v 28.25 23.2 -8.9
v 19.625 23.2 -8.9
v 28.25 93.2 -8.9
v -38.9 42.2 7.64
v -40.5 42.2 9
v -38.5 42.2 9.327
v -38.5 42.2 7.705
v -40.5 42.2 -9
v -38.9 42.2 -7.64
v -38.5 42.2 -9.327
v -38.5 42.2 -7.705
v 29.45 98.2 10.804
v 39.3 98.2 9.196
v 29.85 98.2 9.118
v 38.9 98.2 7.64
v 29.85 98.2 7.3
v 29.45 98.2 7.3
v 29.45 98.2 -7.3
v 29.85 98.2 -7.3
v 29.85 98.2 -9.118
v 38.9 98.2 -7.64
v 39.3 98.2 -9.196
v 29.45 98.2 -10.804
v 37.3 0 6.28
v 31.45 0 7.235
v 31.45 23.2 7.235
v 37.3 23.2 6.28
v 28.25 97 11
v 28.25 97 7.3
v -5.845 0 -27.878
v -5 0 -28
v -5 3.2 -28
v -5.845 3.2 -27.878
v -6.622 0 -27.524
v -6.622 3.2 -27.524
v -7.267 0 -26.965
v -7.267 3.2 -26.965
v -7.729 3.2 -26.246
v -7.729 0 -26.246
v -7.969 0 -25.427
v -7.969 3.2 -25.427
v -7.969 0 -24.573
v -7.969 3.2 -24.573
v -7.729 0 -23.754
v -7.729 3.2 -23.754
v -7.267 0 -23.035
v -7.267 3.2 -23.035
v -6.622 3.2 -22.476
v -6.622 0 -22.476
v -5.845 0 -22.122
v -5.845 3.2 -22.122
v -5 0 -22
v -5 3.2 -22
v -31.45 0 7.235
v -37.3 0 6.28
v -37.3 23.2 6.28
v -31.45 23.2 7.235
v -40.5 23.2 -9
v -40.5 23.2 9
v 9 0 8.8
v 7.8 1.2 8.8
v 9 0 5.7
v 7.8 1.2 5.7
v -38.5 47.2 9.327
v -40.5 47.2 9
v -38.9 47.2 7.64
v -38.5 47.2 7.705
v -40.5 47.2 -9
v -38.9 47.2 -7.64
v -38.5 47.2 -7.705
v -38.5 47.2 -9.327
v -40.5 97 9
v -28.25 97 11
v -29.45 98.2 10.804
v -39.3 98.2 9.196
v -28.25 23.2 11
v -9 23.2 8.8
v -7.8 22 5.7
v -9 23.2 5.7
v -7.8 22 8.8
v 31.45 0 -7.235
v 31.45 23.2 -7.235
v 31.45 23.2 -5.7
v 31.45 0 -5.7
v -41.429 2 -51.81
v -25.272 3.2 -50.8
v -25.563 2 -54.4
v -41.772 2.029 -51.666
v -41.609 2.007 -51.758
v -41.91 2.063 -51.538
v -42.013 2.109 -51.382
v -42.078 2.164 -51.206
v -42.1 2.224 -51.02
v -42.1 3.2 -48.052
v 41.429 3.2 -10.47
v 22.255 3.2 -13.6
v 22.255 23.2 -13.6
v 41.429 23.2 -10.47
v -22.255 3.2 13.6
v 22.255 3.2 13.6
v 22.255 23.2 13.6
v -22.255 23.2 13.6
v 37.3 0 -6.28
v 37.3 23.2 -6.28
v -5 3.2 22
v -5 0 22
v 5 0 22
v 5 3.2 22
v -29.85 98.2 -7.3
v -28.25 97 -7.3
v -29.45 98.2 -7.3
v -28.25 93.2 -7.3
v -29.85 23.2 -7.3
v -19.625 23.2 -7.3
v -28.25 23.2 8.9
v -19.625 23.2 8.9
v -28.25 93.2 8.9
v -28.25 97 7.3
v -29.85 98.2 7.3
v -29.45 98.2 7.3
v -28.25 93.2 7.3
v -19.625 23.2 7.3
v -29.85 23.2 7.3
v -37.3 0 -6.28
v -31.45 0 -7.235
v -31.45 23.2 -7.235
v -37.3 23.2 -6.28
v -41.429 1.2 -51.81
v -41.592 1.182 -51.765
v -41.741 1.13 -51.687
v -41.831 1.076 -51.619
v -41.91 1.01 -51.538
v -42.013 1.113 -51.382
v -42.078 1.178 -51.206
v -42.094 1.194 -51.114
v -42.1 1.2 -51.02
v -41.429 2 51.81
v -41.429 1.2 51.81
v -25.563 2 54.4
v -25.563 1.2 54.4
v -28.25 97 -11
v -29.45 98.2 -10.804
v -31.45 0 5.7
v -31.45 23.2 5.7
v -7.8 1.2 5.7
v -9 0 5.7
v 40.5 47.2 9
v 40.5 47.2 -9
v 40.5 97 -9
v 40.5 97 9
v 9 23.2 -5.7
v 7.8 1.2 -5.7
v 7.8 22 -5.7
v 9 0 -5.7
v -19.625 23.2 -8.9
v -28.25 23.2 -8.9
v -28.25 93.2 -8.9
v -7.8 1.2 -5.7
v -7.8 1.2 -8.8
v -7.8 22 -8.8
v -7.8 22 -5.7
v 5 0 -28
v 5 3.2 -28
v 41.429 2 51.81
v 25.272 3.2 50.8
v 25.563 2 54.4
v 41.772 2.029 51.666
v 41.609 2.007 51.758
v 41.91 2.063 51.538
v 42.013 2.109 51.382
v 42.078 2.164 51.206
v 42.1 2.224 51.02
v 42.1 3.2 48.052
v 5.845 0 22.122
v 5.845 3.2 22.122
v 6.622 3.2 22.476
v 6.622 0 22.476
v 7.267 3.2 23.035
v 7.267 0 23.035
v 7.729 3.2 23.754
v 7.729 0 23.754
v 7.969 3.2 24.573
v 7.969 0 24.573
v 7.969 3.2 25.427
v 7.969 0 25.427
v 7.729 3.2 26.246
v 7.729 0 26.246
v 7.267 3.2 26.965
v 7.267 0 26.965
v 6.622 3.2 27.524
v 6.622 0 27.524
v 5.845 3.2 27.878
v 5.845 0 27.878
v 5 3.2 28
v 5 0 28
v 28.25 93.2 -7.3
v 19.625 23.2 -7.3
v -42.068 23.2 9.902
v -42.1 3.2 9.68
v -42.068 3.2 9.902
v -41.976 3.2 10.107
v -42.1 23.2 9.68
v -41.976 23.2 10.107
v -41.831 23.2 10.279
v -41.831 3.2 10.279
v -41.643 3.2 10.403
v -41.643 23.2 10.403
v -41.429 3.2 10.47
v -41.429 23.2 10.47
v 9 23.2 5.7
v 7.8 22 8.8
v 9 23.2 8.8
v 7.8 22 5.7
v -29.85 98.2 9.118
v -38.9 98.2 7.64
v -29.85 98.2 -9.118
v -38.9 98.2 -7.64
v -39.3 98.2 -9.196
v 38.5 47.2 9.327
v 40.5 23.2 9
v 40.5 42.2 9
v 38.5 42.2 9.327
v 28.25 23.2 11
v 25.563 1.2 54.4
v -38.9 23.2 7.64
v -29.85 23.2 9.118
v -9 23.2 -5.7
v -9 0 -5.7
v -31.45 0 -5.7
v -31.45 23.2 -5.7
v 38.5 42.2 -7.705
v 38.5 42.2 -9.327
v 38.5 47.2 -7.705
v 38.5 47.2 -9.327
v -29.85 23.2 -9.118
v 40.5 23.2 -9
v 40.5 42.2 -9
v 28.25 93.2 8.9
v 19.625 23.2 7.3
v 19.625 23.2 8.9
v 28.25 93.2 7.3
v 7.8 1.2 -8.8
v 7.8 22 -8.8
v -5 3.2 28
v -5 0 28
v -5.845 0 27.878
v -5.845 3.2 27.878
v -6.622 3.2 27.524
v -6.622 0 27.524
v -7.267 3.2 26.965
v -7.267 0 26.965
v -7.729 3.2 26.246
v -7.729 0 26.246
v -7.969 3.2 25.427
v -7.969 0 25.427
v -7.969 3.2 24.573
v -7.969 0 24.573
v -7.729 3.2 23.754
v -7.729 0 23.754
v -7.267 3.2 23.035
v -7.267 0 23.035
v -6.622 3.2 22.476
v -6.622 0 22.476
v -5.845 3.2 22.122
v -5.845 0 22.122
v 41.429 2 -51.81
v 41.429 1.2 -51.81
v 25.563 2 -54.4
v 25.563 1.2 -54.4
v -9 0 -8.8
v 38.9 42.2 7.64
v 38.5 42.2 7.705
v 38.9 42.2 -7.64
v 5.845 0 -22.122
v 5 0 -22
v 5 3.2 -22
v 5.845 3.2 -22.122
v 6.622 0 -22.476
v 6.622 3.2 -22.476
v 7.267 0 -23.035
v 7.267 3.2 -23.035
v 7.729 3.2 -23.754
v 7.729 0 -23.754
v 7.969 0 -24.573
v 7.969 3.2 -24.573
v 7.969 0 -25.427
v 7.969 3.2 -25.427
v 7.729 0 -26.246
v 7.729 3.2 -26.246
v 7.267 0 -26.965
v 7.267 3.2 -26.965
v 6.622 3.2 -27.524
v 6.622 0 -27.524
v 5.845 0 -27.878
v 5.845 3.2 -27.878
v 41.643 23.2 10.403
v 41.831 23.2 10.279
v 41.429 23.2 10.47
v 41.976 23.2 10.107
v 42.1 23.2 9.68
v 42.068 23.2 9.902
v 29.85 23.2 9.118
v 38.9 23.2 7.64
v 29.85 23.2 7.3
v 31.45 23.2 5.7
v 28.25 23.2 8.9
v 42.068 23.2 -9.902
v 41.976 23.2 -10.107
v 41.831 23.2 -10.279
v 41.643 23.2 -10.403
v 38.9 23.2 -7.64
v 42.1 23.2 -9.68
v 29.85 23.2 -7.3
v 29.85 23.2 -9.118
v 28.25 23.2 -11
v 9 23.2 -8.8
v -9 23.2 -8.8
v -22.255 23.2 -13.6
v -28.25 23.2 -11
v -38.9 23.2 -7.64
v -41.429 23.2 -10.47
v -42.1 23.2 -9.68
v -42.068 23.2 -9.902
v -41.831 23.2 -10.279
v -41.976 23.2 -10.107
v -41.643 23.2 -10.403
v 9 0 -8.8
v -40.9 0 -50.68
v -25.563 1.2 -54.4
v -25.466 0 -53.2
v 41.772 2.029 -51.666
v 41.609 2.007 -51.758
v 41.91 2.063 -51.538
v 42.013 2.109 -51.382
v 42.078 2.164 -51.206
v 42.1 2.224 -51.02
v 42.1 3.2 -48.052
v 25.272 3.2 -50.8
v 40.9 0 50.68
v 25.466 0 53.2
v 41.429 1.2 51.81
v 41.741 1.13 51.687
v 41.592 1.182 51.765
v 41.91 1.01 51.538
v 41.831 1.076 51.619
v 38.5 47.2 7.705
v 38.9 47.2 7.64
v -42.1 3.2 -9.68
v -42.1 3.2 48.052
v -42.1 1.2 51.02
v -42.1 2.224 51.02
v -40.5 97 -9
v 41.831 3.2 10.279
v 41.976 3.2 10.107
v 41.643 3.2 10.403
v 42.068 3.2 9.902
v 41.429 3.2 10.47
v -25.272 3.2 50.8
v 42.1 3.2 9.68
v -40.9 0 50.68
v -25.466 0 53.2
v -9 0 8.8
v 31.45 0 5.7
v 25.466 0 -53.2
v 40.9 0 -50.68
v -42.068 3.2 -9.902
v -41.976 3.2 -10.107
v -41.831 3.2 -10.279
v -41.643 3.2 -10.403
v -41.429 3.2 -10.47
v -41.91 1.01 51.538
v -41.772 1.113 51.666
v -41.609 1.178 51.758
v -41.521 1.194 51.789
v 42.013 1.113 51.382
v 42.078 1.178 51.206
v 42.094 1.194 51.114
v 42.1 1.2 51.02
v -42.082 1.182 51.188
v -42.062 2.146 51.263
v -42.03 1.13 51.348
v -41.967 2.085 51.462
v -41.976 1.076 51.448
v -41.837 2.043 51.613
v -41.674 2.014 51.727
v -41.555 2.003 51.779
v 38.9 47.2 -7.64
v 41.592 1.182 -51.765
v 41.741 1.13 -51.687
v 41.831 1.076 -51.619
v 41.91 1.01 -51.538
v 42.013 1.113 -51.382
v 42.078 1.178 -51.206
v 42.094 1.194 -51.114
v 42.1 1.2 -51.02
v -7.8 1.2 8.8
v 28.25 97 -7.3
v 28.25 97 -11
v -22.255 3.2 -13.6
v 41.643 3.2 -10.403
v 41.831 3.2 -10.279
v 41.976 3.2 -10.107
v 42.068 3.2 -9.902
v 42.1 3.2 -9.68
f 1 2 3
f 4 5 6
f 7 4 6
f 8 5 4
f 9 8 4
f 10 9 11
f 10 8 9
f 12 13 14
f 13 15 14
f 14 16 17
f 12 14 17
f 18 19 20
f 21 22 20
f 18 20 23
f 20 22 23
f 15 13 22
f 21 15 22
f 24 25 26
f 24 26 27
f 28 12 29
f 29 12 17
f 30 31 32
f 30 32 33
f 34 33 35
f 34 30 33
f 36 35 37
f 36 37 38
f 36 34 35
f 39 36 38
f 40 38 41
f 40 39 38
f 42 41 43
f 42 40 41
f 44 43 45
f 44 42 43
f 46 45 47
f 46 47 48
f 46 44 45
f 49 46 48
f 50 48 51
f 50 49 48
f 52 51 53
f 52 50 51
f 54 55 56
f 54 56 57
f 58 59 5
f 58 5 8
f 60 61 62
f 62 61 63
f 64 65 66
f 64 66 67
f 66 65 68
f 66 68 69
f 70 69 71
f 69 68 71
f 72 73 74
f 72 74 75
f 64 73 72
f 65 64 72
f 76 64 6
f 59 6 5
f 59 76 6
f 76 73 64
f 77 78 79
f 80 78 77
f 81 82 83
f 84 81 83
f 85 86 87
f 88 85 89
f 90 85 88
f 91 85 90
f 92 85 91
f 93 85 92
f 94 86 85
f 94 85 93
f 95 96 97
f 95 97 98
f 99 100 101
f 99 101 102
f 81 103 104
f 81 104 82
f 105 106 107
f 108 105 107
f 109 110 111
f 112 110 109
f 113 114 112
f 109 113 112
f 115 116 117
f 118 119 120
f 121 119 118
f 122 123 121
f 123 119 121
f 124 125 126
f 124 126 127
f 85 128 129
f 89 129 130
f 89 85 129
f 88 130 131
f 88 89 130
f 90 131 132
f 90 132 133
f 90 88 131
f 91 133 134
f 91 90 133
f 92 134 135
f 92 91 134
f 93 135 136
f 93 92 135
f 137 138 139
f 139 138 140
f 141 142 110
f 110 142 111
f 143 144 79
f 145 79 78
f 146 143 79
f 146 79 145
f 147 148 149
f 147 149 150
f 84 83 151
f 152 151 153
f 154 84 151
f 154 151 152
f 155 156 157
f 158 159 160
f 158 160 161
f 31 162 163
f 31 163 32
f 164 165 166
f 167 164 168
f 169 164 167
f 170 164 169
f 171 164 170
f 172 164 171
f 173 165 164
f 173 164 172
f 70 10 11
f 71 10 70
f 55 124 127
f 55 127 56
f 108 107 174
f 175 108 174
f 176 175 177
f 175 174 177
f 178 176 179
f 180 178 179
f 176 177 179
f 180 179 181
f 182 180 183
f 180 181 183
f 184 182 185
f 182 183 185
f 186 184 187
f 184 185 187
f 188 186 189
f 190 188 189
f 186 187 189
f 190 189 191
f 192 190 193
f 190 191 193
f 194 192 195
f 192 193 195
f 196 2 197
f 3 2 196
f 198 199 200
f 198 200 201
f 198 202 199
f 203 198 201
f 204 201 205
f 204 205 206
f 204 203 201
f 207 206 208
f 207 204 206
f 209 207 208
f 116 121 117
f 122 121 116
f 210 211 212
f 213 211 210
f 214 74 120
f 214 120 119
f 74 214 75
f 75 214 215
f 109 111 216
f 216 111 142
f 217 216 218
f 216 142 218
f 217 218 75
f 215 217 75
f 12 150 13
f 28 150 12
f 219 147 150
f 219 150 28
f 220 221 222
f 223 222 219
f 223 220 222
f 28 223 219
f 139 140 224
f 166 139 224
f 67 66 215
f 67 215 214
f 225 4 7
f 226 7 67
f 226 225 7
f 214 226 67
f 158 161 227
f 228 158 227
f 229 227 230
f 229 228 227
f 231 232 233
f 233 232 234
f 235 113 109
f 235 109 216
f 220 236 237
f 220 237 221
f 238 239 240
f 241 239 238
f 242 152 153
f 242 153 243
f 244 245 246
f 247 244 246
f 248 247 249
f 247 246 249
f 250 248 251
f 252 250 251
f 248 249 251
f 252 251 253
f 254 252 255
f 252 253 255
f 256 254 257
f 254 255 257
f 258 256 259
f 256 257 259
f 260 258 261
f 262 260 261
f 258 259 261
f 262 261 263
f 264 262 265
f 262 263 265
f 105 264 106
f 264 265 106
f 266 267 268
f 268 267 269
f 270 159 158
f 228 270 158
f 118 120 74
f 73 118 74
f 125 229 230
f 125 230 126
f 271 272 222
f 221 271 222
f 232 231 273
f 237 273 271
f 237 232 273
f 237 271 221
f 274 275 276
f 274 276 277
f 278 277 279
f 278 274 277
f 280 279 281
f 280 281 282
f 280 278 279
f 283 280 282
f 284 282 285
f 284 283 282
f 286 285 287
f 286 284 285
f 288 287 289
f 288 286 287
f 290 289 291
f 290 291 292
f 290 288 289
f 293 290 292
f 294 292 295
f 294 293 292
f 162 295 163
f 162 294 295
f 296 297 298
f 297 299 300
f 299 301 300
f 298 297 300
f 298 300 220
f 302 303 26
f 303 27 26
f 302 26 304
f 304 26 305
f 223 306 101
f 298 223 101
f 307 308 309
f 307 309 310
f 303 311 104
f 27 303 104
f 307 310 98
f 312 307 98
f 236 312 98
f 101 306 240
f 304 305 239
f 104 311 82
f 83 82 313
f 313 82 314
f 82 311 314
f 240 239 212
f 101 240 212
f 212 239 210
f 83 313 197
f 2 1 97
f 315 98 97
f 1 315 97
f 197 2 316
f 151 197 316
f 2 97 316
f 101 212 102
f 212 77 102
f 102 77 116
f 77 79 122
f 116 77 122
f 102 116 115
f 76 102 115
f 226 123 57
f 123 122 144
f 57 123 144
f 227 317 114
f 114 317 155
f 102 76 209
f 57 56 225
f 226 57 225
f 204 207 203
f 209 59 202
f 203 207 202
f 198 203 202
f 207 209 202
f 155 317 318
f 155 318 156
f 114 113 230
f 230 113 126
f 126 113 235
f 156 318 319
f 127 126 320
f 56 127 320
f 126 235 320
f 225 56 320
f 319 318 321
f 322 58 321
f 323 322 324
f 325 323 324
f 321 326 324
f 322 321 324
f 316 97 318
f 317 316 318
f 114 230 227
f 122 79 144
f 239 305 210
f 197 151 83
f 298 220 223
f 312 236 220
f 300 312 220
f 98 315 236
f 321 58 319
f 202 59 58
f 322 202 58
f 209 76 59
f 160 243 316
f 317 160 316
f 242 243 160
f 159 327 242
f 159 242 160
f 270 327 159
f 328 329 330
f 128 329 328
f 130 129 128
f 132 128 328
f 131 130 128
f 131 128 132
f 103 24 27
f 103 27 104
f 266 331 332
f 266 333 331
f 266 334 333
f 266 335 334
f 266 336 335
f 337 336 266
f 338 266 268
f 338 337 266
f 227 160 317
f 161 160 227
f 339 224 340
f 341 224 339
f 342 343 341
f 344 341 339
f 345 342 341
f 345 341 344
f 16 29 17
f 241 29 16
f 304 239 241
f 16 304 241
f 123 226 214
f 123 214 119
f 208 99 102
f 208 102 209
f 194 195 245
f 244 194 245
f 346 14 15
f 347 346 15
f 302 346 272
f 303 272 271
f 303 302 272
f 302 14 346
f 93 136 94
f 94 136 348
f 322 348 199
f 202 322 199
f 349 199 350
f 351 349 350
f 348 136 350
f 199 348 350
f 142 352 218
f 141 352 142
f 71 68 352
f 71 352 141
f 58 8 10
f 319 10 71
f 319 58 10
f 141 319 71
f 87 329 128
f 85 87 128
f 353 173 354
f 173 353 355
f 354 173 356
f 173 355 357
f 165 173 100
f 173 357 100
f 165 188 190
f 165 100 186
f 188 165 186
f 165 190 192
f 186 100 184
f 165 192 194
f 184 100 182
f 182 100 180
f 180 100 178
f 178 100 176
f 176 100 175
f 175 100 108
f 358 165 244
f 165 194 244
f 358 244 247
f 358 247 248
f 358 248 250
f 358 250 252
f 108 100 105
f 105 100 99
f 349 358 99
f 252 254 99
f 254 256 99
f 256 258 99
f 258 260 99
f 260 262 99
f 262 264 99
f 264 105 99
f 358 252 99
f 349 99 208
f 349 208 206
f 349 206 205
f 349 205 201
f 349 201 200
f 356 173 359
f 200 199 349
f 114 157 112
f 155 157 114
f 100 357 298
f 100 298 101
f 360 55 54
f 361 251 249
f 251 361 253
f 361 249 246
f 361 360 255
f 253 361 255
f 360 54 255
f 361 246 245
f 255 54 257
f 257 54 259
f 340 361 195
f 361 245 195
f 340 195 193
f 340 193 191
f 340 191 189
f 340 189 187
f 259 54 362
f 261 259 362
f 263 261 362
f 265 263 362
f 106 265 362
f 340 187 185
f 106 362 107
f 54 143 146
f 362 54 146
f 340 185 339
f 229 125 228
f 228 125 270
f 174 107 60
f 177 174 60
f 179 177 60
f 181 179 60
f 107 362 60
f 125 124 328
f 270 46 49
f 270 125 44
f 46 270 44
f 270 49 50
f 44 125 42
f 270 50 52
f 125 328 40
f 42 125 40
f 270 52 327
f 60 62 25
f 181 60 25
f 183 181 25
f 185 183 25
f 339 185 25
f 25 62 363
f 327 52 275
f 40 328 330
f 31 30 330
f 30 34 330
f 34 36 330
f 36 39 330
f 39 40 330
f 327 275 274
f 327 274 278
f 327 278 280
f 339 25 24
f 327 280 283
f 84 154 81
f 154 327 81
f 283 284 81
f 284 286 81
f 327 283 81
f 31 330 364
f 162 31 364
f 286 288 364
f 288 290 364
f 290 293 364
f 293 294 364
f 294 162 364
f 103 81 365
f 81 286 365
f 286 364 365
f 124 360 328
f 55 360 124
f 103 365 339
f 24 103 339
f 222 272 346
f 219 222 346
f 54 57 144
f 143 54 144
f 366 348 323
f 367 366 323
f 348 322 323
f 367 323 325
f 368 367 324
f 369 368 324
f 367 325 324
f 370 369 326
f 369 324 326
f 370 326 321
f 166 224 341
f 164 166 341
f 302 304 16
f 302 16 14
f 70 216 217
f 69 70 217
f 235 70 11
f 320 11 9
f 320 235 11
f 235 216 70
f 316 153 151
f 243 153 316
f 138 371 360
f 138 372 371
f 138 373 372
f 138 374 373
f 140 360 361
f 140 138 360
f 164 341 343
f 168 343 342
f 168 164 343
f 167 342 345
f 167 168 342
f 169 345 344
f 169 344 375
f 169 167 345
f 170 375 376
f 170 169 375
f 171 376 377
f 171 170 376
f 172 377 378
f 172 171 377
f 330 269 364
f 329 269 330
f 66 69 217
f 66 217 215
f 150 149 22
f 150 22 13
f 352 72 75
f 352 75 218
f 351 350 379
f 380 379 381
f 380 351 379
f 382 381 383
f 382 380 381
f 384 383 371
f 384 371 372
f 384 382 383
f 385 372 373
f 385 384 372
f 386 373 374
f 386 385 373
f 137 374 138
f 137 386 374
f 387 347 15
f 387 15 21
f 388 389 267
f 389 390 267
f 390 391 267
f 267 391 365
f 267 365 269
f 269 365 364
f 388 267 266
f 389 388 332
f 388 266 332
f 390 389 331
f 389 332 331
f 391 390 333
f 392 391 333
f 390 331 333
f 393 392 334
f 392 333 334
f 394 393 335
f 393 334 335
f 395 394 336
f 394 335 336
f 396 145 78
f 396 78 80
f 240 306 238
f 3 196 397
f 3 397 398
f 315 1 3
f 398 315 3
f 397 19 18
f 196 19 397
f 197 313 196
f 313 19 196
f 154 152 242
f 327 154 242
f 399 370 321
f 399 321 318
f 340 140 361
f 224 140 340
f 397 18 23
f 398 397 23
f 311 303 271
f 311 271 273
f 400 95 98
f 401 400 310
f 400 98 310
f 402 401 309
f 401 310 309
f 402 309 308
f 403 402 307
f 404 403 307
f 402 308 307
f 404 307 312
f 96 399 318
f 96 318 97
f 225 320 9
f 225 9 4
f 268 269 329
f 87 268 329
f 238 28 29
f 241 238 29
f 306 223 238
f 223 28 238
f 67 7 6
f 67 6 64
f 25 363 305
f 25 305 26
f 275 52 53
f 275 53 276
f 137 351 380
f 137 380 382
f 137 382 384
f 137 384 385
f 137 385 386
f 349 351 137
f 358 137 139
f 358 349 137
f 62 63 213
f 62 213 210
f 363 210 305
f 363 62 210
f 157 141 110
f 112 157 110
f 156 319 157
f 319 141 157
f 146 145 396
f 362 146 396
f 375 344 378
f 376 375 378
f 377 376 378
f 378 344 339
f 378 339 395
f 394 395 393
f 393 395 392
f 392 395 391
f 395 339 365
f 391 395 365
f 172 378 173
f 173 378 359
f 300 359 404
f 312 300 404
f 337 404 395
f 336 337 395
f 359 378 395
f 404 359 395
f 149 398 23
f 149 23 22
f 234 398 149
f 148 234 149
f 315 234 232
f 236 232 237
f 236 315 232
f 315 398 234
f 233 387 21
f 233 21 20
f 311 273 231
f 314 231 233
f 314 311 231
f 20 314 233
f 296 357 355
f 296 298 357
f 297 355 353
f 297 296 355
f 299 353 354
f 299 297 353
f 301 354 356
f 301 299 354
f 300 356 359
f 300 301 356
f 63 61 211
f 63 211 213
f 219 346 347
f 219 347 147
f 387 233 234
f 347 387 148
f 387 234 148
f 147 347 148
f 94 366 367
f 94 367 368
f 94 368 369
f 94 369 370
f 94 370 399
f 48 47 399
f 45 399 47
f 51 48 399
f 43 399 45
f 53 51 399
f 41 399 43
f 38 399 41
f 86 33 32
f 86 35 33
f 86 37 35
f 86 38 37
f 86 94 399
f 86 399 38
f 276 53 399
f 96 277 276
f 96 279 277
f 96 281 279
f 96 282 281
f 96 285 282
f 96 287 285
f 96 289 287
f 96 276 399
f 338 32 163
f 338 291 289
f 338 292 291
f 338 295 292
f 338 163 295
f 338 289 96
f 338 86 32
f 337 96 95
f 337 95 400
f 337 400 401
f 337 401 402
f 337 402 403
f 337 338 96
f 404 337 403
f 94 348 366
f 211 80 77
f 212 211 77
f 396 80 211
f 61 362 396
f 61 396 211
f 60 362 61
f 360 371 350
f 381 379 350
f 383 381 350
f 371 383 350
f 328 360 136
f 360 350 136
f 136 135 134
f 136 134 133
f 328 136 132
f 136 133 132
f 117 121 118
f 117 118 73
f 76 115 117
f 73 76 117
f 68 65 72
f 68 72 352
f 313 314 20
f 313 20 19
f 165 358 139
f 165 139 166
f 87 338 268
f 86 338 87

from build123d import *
from OCP.BRepFilletAPI import BRepFilletAPI_MakeChamfer

# Parameters (mm, degrees)
BOSS_EXTRUDE1_DEPTH     = 23.2
BOSS_EXTRUDE2_START     = 23.2
BOSS_EXTRUDE2_DEPTH     = 75
CUT_EXTRUDE1_DEPTH      = 108.706127959
CUT_EXTRUDE1_DEPTH_BACK = 108.706127959
SKETCH2_W               = 2
SKETCH2_H               = 5
CUT_EXTRUDE2_DEPTH      = 108.706127959
CUT_EXTRUDE2_DEPTH_BACK = 108.706127959
BOSS_EXTRUDE3_DEPTH     = 3.2
CUT_EXTRUDE3_DEPTH      = 111.057303256
CUT_EXTRUDE3_DEPTH_BACK = 111.057303256
BOSS_EXTRUDE4_DEPTH     = 3.2
BOSS_EXTRUDE5_DEPTH     = 3.2
CUT_EXTRUDE4_DEPTH      = 3.2
CHAMFER1_SIZE           = 1.2
CHAMFER1_SIZE2          = 3.6
CHAMFER2_SIZE           = 1.2
FILLET1_R               = 0.8


with BuildPart() as part:
    # Sketch1 → Boss-Extrude1 (new body)
    with BuildSketch(Plane(origin=(0, 0, 0), x_dir=(1, 0, 0), z_dir=(0, 1, 0))):
        Polygon((-22.25475327, 13.6), (22.25475327, 13.6), (42.1, 10.359959718), (42.1, -10.359959718), (22.25475327, -13.6), (-22.25475327, -13.6), (-42.1, -10.359959718), (-42.1, 10.359959718), align=None)
    extrude(amount=BOSS_EXTRUDE1_DEPTH)

    # Sketch1<3> → Boss-Extrude2 (add)
    with BuildSketch(Plane(origin=(0, 0, 0), x_dir=(1, 0, 0), z_dir=(0, 1, 0)).offset(BOSS_EXTRUDE2_START)):
        Polygon((40.5, -9), (28.25, -11), (28.25, -8.9), (11, -8.9), (11, -12), (-11, -12), (-11, -8.9), (-28.25, -8.9), (-28.25, -11), (-40.5, -9), (-40.5, 9), (-28.25, 11), (-28.25, 8.9), (-11, 8.9), (-11, 12), (11, 12), (11, 8.9), (28.25, 8.9), (28.25, 11), (40.5, 9), align=None)
        Polygon((-38.9, -7.640040282), (-29.85, -9.117591303), (-29.85, -7.3), (-9.4, -7.3), (-9.4, -10.4), (9.4, -10.4), (9.4, -7.3), (29.85, -7.3), (29.85, -9.117591303), (38.9, -7.640040282), (38.9, 7.640040282), (29.85, 9.117591303), (29.85, 7.3), (9.4, 7.3), (9.4, 10.4), (-9.4, 10.4), (-9.4, 7.3), (-29.85, 7.3), (-29.85, 9.117591303), (-38.9, 7.640040282), align=None, mode=Mode.SUBTRACT)
    extrude(amount=BOSS_EXTRUDE2_DEPTH)

    # Sketch2 → Cut-Extrude1 (cut, two sides: drawn at the far end of the back side and taken through both)
    with BuildSketch(Plane.XY.offset(-CUT_EXTRUDE1_DEPTH_BACK)):
        with Locations((-39.5, 44.7)):
            Rectangle(SKETCH2_W, SKETCH2_H)
        with Locations((39.5, 44.7)):
            Rectangle(SKETCH2_W, SKETCH2_H)
    extrude(amount=CUT_EXTRUDE1_DEPTH + CUT_EXTRUDE1_DEPTH_BACK, mode=Mode.SUBTRACT)

    # Sketch3 → Cut-Extrude2 (cut, two sides: drawn at the far end of the back side and taken through both)
    with BuildSketch(Plane.XY.offset(-CUT_EXTRUDE2_DEPTH_BACK)):
        Polygon((-28.25, 93.2), (-19.625, 23.2), (19.625, 23.2), (28.25, 93.2), (28.25, 98.2), (-28.25, 98.2), align=None)
    extrude(amount=CUT_EXTRUDE2_DEPTH + CUT_EXTRUDE2_DEPTH_BACK, mode=Mode.SUBTRACT)

    # Sketch4 → Boss-Extrude3 (add)
    with BuildSketch(Plane(origin=(0, 0, 0), x_dir=(1, 0, 0), z_dir=(0, 1, 0))):
        Polygon((23.292779429, 26.4), (42.1, 23.329433376), (42.1, -23.329433376), (23.292779429, -26.4), (-23.292779429, -26.4), (-42.1, -23.329433376), (-42.1, 23.329433376), (-23.292779429, 26.4), align=None)
    extrude(amount=BOSS_EXTRUDE3_DEPTH)

    # Sketch1<4> → Cut-Extrude3 (cut, two sides: drawn at the far end of the back side and taken through both)
    with BuildSketch(Plane(origin=(0, 0, 0), x_dir=(1, 0, 0), z_dir=(0, 1, 0)).offset(-CUT_EXTRUDE3_DEPTH_BACK)):
        Polygon((-31.45, -5.7), (-7.8, -5.7), (-7.8, -8.8), (7.8, -8.8), (7.8, -5.7), (31.45, -5.7), (31.45, -7.235182606), (37.3, -6.280080565), (37.3, 6.280080565), (31.45, 7.235182606), (31.45, 5.7), (7.8, 5.7), (7.8, 8.8), (-7.8, 8.8), (-7.8, 5.7), (-31.45, 5.7), (-31.45, 7.235182606), (-37.3, 6.280080565), (-37.3, -6.280080565), (-31.45, -7.235182606), align=None)
    extrude(amount=CUT_EXTRUDE3_DEPTH + CUT_EXTRUDE3_DEPTH_BACK, mode=Mode.SUBTRACT)

    # Sketch5 → Boss-Extrude4 (add)
    with BuildSketch(Plane(origin=(0, 0, 0), x_dir=(1, 0, 0), z_dir=(0, 1, 0))):
        Polygon((23.292779429, 26.4), (42.1, 23.329433376), (42.1, 51.700157004), (25.563461651, 54.4), (-25.563461651, 54.4), (-42.1, 51.700157004), (-42.1, 23.329433376), (-23.292779429, 26.4), align=None)
        Polygon((-42.1, -23.329433376), (-42.1, -51.700157004), (-25.563461651, -54.4), (25.563461651, -54.4), (42.1, -51.700157004), (42.1, -23.329433376), (23.292779429, -26.4), (-23.292779429, -26.4), align=None)
    extrude(amount=BOSS_EXTRUDE4_DEPTH)

    # Sketch6 → Boss-Extrude5 (add)
    with BuildSketch(Plane(origin=(0, 0, 0), x_dir=(1, 0, 0), z_dir=(0, 1, 0))):
        Polygon((25.563461651, 54.4), (42.1, 51.700157004), (42.1, 48.100157004), (-42.1, 48.100157004), (-42.1, 51.700157004), (-25.563461651, 54.4), align=None)
        Polygon((42.1, -48.100157004), (42.1, -51.700157004), (25.563461651, -54.4), (-25.563461651, -54.4), (-42.1, -51.700157004), (-42.1, -48.100157004), align=None)
    extrude(amount=BOSS_EXTRUDE5_DEPTH)

    # Sketch7 → Cut-Extrude4 (cut)
    with BuildSketch(Plane(origin=(0, 0, 0), x_dir=(0, 0, -1), z_dir=(0, 1, 0))):
        with BuildLine():
            Line((28, -5), (28, 5))
            ThreePointArc((28, 5), (25, 8), (22, 5))
            Line((22, 5), (22, -5))
            ThreePointArc((22, -5), (25, -8), (28, -5))
        make_face()
        with BuildLine():
            Line((-28, -5), (-28, 5))
            ThreePointArc((-28, 5), (-25, 8), (-22, 5))
            Line((-22, 5), (-22, -5))
            ThreePointArc((-22, -5), (-25, -8), (-28, -5))
        make_face()
    extrude(amount=CUT_EXTRUDE4_DEPTH, mode=Mode.SUBTRACT)

    # Chamfer1: one chamfer whose edges measure the first distance from different faces: ONE call of the kernel's chamfer builder (chamfer() names one face for all edges)
    chamfer1_edges_1 = [part.edges().sort_by_distance(p)[0] for p in [
        (-33.831730825, 3.2, 53.050078502),
    ]]
    chamfer1_side_1 = [part.faces().sort_by_distance(p)[0] for p in [
        (-33.831730825, 1.6, 53.050078502),
    ]]
    chamfer1_edges_2 = [part.edges().sort_by_distance(p)[0] for p in [
        (0, 3.2, 54.4),
    ]]
    chamfer1_side_2 = [part.faces().sort_by_distance(p)[0] for p in [
        (0, 1.6, 54.4),
    ]]
    chamfer1_edges_3 = [part.edges().sort_by_distance(p)[0] for p in [
        (33.831730825, 3.2, 53.050078502),
    ]]
    chamfer1_side_3 = [part.faces().sort_by_distance(p)[0] for p in [
        (33.831730825, 1.6, 53.050078502),
    ]]
    chamfer1_edges_4 = [part.edges().sort_by_distance(p)[0] for p in [
        (33.831730825, 3.2, -53.050078502),
    ]]
    chamfer1_side_4 = [part.faces().sort_by_distance(p)[0] for p in [
        (33.831730825, 1.6, -53.050078502),
    ]]
    chamfer1_edges_5 = [part.edges().sort_by_distance(p)[0] for p in [
        (0, 3.2, -54.4),
    ]]
    chamfer1_side_5 = [part.faces().sort_by_distance(p)[0] for p in [
        (0, 1.6, -54.4),
    ]]
    chamfer1_edges_6 = [part.edges().sort_by_distance(p)[0] for p in [
        (-33.831730825, 3.2, -53.050078502),
    ]]
    chamfer1_side_6 = [part.faces().sort_by_distance(p)[0] for p in [
        (-33.831730825, 1.6, -53.050078502),
    ]]
    chamfer1 = BRepFilletAPI_MakeChamfer(part.part.solid().wrapped)
    for e in chamfer1_edges_1:
        chamfer1.Add(CHAMFER1_SIZE, CHAMFER1_SIZE2, e.wrapped, chamfer1_side_1[0].wrapped)  # the first distance lies on this face
    for e in chamfer1_edges_2:
        chamfer1.Add(CHAMFER1_SIZE, CHAMFER1_SIZE2, e.wrapped, chamfer1_side_2[0].wrapped)  # the first distance lies on this face
    for e in chamfer1_edges_3:
        chamfer1.Add(CHAMFER1_SIZE, CHAMFER1_SIZE2, e.wrapped, chamfer1_side_3[0].wrapped)  # the first distance lies on this face
    for e in chamfer1_edges_4:
        chamfer1.Add(CHAMFER1_SIZE, CHAMFER1_SIZE2, e.wrapped, chamfer1_side_4[0].wrapped)  # the first distance lies on this face
    for e in chamfer1_edges_5:
        chamfer1.Add(CHAMFER1_SIZE, CHAMFER1_SIZE2, e.wrapped, chamfer1_side_5[0].wrapped)  # the first distance lies on this face
    for e in chamfer1_edges_6:
        chamfer1.Add(CHAMFER1_SIZE, CHAMFER1_SIZE2, e.wrapped, chamfer1_side_6[0].wrapped)  # the first distance lies on this face
    add(Compound.cast(chamfer1.Shape()), mode=Mode.REPLACE)

    # Chamfer2
    chamfer2_edges = [part.edges().sort_by_distance(p)[0] for p in [
        (-42.1, 0, 0),
        (-7.8, 23.2, 7.25),
        (7.8, 23.2, 7.25),
        (7.8, 23.2, -7.25),
        (-7.8, 23.2, -7.25),
        (-7.8, 0, -7.25),
        (7.8, 0, -7.25),
        (7.8, 0, 7.25),
        (-7.8, 0, 7.25),
        (40.5, 98.2, 0),
        (28.25, 98.2, -9.15),
        (-28.25, 98.2, 9.15),
        (0, 0, 54.4),
        (33.831730825, 0, 53.050078502),
        (-33.831730825, 0, 53.050078502),
        (33.831730825, 0, -53.050078502),
        (0, 0, -54.4),
        (-33.831730825, 0, -53.050078502),
        (28.25, 98.2, 9.15),
        (-28.25, 98.2, -9.15),
        (-40.5, 98.2, 0),
        (42.1, 0, 0),
    ]]
    chamfer(chamfer2_edges, length=CHAMFER2_SIZE)

    # Fillet1
    fillet1_edges = [part.edges().sort_by_distance(p)[0] for p in [
        (-42.1, 13.2, 10.359959718),
        (42.1, 13.2, 10.359959718),
        (42.1, 13.2, -10.359959718),
        (-42.1, 13.2, -10.359959718),
        (-42.1, 1.6, 51.700157004),
        (-42.1, 1.6, -51.700157004),
        (42.1, 1.6, -51.700157004),
        (42.1, 1.6, 51.700157004),
    ]]
    fillet(fillet1_edges, radius=FILLET1_R)


solid = part.part
